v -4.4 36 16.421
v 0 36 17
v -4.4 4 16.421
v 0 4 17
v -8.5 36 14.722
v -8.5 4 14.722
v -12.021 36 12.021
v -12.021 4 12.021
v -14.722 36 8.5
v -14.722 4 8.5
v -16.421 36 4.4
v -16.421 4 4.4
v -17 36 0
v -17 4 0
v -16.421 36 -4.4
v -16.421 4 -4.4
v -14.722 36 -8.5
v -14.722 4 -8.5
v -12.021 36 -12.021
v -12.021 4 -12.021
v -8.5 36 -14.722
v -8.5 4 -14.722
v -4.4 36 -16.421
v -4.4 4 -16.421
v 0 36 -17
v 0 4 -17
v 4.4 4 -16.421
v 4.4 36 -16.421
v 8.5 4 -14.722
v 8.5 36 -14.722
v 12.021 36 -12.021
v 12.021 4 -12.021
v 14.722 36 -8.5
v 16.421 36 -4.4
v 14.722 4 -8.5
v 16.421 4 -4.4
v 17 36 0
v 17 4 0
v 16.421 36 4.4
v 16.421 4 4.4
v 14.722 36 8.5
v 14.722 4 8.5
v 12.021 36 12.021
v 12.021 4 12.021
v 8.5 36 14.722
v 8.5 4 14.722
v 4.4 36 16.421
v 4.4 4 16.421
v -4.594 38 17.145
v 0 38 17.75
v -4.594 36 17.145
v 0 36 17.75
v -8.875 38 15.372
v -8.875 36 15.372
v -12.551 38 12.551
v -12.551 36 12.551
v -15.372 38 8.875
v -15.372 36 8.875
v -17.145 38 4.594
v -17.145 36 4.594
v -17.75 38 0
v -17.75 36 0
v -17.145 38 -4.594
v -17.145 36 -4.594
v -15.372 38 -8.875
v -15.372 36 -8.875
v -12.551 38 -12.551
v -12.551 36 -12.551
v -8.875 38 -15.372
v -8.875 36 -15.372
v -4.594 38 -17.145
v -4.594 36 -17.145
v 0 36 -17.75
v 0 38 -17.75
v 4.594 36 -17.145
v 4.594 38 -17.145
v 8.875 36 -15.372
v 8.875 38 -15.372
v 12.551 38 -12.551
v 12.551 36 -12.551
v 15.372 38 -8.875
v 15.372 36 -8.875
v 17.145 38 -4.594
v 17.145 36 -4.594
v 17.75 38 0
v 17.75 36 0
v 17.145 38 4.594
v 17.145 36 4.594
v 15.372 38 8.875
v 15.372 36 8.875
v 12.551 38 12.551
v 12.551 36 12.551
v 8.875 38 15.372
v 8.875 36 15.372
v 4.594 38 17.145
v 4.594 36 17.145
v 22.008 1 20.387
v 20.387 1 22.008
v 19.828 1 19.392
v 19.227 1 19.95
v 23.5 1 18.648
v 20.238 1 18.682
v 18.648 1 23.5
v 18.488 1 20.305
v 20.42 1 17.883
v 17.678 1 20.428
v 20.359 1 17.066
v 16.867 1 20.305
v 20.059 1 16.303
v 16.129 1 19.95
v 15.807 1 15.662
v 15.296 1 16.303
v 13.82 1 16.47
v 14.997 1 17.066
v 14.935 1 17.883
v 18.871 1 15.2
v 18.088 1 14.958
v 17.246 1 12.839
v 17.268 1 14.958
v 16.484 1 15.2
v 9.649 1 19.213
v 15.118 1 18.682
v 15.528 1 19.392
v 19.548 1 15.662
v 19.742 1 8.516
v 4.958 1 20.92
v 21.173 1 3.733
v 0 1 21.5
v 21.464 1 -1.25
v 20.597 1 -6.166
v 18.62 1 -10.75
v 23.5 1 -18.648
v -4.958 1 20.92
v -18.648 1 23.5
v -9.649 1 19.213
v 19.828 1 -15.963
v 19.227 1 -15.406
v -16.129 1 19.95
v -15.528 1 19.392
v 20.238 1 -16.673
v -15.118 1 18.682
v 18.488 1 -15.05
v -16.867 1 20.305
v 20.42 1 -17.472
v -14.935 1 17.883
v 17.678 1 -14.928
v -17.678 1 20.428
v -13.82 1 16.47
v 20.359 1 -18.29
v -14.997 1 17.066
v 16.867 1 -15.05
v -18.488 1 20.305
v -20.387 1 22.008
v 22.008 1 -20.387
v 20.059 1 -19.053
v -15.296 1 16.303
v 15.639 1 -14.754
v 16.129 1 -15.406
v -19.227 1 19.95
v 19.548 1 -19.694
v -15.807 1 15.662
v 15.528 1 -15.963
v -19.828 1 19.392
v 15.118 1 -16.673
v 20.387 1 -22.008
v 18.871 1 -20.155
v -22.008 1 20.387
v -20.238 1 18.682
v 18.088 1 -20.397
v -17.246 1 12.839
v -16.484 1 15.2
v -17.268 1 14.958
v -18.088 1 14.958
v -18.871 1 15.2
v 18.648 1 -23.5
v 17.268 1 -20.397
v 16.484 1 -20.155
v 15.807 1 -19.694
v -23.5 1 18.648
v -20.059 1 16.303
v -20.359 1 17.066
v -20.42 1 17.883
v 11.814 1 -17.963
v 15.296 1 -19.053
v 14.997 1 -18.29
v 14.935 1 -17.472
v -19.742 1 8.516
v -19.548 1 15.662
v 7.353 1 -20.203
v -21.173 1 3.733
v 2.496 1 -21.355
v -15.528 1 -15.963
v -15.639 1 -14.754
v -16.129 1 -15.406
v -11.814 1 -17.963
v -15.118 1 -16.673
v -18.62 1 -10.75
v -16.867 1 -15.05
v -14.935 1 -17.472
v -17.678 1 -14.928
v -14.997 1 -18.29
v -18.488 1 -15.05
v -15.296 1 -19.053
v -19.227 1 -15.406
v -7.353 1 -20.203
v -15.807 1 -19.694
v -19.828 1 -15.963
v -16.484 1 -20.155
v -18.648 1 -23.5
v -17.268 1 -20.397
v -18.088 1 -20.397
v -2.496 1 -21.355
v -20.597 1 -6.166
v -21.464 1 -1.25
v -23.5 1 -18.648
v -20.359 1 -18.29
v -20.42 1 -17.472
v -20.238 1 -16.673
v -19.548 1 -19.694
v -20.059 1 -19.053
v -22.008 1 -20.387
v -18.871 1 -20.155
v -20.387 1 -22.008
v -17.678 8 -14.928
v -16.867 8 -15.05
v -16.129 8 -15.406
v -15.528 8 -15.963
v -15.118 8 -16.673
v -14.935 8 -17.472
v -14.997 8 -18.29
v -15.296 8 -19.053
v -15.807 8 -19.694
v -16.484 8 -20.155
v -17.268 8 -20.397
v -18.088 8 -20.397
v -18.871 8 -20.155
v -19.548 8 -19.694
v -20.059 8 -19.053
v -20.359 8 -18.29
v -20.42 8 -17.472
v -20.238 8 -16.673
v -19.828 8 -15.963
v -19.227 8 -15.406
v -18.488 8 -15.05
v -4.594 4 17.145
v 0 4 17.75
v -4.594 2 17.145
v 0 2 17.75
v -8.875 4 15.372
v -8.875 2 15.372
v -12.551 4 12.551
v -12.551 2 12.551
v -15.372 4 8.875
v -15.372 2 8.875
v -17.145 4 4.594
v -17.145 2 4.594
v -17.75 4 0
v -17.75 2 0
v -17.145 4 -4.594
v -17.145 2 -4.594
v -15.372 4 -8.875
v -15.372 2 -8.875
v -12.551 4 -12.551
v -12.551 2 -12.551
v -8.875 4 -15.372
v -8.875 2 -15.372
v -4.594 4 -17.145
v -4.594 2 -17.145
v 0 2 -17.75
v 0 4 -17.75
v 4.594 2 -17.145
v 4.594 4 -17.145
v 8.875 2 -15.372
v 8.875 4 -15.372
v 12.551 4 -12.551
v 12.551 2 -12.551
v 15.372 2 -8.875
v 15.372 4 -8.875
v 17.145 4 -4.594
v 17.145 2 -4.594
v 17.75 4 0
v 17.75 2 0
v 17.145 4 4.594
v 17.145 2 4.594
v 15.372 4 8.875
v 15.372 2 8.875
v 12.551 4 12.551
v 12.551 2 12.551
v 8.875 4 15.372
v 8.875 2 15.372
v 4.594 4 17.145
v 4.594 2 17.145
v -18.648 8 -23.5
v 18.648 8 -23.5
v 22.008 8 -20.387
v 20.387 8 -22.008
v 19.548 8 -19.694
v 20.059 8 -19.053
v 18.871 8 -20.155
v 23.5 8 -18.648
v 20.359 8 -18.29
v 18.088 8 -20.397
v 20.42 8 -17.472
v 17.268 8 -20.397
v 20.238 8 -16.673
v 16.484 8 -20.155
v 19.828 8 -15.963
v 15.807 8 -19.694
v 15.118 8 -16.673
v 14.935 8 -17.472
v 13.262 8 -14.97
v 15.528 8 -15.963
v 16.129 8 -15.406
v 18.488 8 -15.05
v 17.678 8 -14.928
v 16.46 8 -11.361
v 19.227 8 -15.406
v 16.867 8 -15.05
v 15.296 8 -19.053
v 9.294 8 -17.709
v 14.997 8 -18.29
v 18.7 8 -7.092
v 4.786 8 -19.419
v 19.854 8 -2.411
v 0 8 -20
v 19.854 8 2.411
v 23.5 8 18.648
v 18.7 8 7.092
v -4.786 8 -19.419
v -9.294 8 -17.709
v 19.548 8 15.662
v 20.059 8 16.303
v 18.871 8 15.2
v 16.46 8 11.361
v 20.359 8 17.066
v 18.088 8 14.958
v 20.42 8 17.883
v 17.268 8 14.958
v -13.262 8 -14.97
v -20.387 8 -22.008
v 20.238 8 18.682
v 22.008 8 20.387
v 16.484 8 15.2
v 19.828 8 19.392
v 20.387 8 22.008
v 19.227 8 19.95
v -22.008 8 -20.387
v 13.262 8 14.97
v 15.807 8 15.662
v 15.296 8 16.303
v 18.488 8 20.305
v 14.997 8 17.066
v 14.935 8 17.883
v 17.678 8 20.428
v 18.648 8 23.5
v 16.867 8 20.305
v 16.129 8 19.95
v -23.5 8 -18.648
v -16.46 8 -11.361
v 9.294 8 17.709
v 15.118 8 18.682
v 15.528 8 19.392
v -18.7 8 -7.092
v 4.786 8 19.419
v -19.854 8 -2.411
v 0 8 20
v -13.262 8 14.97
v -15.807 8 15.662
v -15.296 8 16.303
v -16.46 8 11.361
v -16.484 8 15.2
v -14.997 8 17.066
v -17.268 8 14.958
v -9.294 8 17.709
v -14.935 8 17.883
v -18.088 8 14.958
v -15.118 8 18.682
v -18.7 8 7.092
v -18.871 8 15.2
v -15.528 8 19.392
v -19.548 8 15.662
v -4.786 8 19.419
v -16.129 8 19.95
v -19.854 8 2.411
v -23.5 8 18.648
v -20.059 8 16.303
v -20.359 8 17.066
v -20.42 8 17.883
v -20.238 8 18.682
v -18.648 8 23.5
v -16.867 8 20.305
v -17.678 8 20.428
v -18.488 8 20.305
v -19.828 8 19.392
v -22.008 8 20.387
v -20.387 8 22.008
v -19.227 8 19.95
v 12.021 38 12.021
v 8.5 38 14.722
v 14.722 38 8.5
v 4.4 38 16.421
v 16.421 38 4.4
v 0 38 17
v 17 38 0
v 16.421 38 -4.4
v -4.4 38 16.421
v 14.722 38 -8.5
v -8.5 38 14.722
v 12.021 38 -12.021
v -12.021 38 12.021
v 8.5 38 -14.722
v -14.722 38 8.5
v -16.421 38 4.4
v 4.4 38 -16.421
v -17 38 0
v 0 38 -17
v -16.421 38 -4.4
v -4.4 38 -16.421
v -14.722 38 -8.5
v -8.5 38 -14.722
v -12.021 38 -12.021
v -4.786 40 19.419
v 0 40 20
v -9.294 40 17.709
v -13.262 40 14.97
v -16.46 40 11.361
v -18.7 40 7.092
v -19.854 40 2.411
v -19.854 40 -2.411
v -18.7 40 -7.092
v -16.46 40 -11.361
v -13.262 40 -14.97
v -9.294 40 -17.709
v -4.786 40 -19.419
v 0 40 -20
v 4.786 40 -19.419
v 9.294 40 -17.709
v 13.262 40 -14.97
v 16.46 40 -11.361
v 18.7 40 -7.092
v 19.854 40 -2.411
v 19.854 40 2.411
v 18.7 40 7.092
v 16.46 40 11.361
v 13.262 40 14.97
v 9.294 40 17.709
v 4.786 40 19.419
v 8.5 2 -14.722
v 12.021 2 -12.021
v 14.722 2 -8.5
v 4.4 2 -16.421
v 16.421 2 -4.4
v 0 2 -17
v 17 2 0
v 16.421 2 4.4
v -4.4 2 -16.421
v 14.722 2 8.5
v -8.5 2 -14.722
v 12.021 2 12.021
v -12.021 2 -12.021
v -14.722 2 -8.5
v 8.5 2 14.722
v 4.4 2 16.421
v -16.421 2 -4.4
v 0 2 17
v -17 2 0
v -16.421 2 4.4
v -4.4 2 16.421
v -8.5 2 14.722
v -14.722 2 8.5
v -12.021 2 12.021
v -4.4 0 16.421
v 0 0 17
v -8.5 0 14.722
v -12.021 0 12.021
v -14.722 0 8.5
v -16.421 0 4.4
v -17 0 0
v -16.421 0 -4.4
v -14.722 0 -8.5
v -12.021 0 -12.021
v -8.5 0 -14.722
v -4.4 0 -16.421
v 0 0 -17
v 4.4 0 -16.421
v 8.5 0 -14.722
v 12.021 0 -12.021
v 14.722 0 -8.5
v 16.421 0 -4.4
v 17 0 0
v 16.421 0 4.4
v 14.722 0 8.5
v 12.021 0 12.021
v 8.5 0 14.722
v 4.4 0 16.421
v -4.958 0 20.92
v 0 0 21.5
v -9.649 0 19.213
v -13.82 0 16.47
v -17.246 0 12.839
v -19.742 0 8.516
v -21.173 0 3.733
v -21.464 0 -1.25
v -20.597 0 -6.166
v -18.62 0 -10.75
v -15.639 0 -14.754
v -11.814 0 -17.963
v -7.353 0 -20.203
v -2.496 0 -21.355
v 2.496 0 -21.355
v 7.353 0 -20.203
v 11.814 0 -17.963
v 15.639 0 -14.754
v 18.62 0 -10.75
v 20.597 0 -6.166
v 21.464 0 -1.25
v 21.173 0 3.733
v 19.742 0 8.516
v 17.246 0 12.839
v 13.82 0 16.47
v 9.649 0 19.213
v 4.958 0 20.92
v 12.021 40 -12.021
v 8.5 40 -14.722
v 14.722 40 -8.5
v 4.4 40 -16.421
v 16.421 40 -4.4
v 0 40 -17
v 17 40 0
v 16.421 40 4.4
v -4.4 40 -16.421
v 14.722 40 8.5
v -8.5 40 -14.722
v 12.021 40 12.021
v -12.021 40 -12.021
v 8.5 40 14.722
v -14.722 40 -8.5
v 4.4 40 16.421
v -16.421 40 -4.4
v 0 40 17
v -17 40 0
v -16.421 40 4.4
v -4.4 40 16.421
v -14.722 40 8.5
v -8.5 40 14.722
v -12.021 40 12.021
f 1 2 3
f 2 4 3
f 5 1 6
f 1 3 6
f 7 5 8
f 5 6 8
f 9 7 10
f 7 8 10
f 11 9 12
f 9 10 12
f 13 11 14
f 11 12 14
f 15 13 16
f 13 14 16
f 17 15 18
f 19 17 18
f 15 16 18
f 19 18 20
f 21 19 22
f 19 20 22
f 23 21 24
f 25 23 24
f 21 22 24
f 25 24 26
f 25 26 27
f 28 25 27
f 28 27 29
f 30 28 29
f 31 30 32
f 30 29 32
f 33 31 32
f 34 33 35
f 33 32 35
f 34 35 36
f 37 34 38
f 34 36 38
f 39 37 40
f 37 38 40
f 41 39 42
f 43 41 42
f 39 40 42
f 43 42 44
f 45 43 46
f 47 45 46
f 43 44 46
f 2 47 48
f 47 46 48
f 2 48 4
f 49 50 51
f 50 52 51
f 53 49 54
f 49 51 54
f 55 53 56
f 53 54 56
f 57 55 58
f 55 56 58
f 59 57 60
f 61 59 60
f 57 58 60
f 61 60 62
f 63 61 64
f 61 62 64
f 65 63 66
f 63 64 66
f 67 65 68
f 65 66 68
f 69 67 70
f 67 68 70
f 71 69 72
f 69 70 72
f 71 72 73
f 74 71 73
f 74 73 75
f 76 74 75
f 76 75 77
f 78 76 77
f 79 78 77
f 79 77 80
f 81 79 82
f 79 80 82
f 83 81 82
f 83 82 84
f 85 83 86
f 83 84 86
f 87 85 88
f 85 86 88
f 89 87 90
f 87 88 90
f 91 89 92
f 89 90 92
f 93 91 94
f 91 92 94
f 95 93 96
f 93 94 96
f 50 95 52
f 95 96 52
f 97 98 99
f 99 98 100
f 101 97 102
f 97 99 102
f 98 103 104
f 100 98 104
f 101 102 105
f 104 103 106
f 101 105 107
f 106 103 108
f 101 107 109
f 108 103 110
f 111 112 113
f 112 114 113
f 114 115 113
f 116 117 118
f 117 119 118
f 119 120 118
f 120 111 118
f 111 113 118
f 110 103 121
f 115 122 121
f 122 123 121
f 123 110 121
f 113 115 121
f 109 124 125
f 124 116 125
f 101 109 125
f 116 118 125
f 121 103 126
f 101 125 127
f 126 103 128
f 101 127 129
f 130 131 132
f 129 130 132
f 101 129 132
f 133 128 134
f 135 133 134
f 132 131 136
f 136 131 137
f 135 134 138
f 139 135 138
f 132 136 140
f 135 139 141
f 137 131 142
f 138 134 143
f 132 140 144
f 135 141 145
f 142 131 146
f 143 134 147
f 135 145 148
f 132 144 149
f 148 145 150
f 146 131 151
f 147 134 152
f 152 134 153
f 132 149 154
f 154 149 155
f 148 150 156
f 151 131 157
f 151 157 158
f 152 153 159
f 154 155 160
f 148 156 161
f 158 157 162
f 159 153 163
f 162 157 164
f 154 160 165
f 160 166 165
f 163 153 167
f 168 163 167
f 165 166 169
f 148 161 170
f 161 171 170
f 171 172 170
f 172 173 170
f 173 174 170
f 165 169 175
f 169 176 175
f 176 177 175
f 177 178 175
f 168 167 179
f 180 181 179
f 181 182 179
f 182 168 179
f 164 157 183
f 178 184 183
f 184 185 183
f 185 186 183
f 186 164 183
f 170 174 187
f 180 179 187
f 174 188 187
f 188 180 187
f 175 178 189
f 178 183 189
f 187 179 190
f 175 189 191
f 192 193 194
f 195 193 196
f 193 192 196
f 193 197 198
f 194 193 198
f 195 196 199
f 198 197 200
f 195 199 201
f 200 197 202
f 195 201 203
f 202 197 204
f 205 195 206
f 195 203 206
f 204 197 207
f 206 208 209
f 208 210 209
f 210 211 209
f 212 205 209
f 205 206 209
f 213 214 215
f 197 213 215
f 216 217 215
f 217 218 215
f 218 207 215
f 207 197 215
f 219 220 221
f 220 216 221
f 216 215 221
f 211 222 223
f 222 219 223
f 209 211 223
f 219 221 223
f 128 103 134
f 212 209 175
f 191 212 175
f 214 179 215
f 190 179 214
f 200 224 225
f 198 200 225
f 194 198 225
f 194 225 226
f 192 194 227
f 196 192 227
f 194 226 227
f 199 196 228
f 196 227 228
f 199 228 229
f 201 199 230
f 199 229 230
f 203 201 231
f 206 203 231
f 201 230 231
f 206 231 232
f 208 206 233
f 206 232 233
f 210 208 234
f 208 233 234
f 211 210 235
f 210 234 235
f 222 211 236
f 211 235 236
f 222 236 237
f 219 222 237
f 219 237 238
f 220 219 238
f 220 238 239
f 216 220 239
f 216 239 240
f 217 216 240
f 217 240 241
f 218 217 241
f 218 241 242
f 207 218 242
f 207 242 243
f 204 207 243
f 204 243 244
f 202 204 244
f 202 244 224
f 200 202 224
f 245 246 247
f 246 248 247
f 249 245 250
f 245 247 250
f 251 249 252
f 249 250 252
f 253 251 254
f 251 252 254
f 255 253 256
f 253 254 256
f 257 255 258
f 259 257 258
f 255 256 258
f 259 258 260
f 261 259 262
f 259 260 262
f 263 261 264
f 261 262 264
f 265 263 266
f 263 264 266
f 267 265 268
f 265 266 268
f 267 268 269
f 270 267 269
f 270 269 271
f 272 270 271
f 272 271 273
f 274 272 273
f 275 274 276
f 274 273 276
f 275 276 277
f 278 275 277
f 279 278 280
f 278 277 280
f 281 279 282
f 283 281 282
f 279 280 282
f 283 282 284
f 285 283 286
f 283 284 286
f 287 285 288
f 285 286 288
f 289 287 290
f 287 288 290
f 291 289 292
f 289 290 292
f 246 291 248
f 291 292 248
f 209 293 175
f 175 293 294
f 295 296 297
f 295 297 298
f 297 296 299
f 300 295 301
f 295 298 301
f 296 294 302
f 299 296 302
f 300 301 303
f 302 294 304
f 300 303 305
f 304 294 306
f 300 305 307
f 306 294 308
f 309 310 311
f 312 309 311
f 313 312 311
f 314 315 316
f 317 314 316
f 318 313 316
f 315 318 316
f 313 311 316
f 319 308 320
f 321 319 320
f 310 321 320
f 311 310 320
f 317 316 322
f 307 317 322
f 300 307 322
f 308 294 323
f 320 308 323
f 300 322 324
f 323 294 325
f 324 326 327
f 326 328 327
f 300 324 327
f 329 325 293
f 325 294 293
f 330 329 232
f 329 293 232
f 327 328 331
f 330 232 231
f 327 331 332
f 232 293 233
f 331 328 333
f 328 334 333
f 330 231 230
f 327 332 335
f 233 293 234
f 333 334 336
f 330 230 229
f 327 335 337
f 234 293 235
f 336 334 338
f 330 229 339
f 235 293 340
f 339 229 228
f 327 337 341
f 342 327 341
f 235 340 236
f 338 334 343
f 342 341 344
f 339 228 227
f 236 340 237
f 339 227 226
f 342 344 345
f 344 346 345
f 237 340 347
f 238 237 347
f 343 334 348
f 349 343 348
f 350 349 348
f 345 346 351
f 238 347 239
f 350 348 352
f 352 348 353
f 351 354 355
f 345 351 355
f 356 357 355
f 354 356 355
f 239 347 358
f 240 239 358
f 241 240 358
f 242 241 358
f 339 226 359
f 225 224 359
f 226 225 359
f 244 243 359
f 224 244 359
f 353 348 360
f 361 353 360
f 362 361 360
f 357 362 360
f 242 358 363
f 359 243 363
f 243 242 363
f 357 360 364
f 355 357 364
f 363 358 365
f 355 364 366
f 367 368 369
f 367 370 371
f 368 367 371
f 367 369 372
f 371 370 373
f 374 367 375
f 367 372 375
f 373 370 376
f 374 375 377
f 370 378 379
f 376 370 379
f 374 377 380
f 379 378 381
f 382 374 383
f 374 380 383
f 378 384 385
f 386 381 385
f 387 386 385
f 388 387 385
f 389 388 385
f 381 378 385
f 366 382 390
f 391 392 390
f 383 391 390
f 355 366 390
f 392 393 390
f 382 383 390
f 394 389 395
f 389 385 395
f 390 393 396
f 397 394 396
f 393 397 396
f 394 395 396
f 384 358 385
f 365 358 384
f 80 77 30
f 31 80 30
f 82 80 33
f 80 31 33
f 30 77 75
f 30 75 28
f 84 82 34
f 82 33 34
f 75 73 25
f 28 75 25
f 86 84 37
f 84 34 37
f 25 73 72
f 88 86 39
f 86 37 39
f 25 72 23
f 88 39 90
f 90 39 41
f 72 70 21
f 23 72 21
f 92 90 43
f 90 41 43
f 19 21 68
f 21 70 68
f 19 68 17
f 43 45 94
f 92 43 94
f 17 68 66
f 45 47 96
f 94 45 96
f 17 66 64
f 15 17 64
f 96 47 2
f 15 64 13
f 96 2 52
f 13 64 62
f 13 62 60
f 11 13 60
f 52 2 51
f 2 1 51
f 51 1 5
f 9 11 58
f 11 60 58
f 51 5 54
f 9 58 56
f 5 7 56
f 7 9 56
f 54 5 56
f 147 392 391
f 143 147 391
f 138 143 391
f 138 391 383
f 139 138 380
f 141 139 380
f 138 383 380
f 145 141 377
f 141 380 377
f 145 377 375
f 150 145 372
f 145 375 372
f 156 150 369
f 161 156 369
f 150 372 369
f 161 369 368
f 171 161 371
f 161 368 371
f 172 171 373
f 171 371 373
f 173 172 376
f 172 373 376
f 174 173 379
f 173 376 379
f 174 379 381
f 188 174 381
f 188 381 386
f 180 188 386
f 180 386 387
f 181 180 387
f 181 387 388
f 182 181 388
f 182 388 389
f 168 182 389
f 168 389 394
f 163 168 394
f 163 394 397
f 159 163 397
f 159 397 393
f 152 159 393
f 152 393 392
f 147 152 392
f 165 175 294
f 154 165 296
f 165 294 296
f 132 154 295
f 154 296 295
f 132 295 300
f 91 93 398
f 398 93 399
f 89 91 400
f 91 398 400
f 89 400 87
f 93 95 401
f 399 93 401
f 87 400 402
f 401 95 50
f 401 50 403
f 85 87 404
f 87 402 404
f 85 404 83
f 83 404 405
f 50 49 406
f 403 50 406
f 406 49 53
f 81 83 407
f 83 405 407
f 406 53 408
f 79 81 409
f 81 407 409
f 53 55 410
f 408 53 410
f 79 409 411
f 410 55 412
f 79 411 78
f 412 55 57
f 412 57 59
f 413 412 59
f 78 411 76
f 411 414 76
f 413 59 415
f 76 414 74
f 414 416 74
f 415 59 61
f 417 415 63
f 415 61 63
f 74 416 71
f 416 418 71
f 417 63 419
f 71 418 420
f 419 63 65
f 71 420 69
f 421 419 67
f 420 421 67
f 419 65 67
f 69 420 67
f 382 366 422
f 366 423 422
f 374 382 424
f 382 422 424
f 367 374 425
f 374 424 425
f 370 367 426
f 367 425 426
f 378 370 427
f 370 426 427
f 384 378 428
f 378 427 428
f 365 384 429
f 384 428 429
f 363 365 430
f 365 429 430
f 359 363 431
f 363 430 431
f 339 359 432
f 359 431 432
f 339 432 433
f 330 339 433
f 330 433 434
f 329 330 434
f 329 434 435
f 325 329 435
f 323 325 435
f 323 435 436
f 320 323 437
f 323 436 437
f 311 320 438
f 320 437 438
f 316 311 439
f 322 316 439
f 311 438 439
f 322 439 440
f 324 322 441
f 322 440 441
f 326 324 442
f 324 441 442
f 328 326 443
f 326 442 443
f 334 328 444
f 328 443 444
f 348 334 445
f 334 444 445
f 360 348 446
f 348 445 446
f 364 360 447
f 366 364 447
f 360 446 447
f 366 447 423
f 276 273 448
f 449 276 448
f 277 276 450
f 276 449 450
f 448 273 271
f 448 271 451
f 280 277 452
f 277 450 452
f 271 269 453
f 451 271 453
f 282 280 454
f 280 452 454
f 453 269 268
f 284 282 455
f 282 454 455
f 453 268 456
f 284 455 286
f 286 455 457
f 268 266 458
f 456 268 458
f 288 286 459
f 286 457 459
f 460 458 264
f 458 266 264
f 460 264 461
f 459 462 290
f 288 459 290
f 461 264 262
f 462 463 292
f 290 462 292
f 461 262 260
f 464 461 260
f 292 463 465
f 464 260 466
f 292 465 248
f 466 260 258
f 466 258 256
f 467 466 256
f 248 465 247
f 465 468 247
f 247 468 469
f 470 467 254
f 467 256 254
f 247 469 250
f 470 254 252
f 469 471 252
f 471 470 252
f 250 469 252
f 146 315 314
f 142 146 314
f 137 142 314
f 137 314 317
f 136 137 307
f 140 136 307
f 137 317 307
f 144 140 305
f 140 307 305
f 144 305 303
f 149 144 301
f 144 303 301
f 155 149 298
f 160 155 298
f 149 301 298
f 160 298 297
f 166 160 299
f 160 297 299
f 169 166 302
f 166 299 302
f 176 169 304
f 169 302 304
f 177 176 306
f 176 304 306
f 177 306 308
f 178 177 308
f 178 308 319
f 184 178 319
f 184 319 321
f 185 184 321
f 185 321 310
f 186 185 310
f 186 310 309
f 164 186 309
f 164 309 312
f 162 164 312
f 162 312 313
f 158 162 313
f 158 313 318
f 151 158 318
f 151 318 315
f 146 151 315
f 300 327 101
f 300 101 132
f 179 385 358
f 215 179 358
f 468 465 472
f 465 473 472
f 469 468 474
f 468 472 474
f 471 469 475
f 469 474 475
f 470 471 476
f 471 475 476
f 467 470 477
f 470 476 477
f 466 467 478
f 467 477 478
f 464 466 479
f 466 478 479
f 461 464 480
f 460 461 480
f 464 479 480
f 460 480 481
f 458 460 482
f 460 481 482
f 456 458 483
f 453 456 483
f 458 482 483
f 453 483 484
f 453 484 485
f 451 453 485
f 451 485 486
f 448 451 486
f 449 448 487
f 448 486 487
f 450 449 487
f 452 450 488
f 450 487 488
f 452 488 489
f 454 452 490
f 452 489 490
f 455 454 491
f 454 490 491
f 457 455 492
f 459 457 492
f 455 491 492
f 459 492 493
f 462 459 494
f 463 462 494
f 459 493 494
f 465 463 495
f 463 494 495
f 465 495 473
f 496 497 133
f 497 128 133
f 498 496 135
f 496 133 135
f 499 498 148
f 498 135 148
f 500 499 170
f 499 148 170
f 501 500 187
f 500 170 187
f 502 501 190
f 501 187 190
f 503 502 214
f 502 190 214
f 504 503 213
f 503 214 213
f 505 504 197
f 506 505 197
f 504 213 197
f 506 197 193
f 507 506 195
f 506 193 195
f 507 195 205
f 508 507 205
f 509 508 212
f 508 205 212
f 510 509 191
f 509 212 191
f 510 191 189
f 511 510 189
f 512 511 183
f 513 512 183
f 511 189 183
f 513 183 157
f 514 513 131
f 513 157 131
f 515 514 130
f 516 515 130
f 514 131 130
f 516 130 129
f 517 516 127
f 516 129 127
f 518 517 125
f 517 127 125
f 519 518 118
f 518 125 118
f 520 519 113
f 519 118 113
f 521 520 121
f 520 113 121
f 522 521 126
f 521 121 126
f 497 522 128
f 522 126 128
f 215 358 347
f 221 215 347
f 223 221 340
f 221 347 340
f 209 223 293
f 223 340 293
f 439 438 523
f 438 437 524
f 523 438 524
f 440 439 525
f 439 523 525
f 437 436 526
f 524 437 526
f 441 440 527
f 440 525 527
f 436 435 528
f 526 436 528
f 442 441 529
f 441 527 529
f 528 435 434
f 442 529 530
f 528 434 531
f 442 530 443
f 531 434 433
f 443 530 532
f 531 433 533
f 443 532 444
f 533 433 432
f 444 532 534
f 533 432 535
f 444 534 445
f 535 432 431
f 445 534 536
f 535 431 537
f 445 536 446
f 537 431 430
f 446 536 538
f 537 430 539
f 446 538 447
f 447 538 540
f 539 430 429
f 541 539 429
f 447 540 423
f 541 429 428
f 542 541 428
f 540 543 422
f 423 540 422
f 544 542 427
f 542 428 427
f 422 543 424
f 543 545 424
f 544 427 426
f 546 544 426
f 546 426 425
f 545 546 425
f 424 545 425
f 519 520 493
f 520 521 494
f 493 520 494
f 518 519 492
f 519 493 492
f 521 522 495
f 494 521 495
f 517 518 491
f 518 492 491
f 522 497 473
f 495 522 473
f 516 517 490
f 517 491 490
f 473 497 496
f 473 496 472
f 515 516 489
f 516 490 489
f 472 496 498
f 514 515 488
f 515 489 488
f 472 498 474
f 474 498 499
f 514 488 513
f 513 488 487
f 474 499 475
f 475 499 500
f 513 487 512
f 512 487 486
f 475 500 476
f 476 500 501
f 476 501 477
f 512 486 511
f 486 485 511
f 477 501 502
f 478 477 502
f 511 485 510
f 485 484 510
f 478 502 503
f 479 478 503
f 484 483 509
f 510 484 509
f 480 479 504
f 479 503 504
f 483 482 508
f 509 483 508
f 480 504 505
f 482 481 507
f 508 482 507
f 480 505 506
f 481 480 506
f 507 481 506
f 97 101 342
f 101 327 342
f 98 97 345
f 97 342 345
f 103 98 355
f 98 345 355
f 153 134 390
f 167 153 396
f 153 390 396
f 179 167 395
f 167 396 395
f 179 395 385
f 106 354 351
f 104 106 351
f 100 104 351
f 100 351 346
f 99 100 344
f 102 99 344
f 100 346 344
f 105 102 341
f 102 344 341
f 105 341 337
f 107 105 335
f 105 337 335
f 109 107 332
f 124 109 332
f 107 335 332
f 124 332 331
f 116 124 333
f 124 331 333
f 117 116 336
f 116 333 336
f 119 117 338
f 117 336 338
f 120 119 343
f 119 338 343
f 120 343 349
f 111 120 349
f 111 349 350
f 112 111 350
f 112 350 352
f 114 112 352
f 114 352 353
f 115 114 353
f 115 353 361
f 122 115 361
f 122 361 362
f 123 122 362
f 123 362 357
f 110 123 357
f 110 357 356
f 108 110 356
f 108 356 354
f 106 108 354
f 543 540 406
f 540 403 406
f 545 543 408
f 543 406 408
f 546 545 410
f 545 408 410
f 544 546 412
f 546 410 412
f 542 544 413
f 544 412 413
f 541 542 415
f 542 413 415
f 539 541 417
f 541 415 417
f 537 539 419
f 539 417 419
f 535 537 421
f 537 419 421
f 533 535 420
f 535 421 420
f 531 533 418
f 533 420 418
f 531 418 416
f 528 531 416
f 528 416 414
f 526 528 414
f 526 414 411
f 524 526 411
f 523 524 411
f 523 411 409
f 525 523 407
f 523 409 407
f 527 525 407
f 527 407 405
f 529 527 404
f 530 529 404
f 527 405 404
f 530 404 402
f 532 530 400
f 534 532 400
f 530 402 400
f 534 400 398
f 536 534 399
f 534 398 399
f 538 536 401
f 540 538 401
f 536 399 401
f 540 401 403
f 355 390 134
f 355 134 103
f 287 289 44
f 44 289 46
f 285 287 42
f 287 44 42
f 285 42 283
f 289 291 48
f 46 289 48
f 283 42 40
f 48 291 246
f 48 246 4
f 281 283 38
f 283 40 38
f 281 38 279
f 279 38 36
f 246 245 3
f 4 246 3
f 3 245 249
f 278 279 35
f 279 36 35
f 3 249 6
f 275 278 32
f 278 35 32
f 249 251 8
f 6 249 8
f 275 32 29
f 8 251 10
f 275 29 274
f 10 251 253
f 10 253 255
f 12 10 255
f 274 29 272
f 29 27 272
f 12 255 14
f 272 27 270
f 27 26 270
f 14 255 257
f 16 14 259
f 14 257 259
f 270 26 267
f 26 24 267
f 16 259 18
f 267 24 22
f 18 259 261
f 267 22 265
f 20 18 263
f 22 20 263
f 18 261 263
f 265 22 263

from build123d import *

# Parameters (mm, degrees)
SKETCH_4_R           = 2.75
CUT_EXTRUDE_1_DEPTH  = 54.141321022
SKETCH_5_OUTSIDE_W   = 80.762
SKETCH_5_OUTSIDE_H   = 80.762
SKETCH_5_OUTSIDE_W_2 = 47
SKETCH_5_OUTSIDE_H_2 = 47
CUT_EXTRUDE_2_DEPTH  = 54.141321022


with BuildPart() as part:
    # Эскиз1 → Повернуть1 (revolve)
    with BuildSketch(Plane.XY):
        Polygon((-17, 0), (-21.5, 0), (-21.5, 1), (-30, 1), (-30, 8), (-20, 8), (-20, 40), (-17, 40), (-17, 38), (-17.75, 38), (-17.75, 36), (-17, 36), (-17, 4), (-17.75, 4), (-17.75, 2), (-17, 2), align=None)
    revolve(axis=Axis((0, 50.260536223, 0), (0, -1, 0)))

    # Эскиз4 → Вырез-Вытянуть1 (cut, through all)
    with BuildSketch(Plane(origin=(0, 8, 0), x_dir=(1, 0, 0), z_dir=(0, 1, 0))):
        with Locations((-17.67766953, 17.67766953)):
            Circle(SKETCH_4_R)
        with Locations((-17.67766953, -17.67766953)):
            Circle(SKETCH_4_R)
        with Locations((17.67766953, 17.67766953)):
            Circle(SKETCH_4_R)
        with Locations((17.67766953, -17.67766953)):
            Circle(SKETCH_4_R)
    extrude(amount=-CUT_EXTRUDE_1_DEPTH, mode=Mode.SUBTRACT)

    # Эскиз5 outside → Вырез-Вытянуть2 (cut, through all)
    with BuildSketch(Plane(origin=(0, 8, 0), x_dir=(1, 0, 0), z_dir=(0, 1, 0))):
        Rectangle(SKETCH_5_OUTSIDE_W, SKETCH_5_OUTSIDE_H)
        Rectangle(SKETCH_5_OUTSIDE_W_2, SKETCH_5_OUTSIDE_H_2, mode=Mode.SUBTRACT)
    extrude(amount=-CUT_EXTRUDE_2_DEPTH, mode=Mode.SUBTRACT)


solid = part.part
